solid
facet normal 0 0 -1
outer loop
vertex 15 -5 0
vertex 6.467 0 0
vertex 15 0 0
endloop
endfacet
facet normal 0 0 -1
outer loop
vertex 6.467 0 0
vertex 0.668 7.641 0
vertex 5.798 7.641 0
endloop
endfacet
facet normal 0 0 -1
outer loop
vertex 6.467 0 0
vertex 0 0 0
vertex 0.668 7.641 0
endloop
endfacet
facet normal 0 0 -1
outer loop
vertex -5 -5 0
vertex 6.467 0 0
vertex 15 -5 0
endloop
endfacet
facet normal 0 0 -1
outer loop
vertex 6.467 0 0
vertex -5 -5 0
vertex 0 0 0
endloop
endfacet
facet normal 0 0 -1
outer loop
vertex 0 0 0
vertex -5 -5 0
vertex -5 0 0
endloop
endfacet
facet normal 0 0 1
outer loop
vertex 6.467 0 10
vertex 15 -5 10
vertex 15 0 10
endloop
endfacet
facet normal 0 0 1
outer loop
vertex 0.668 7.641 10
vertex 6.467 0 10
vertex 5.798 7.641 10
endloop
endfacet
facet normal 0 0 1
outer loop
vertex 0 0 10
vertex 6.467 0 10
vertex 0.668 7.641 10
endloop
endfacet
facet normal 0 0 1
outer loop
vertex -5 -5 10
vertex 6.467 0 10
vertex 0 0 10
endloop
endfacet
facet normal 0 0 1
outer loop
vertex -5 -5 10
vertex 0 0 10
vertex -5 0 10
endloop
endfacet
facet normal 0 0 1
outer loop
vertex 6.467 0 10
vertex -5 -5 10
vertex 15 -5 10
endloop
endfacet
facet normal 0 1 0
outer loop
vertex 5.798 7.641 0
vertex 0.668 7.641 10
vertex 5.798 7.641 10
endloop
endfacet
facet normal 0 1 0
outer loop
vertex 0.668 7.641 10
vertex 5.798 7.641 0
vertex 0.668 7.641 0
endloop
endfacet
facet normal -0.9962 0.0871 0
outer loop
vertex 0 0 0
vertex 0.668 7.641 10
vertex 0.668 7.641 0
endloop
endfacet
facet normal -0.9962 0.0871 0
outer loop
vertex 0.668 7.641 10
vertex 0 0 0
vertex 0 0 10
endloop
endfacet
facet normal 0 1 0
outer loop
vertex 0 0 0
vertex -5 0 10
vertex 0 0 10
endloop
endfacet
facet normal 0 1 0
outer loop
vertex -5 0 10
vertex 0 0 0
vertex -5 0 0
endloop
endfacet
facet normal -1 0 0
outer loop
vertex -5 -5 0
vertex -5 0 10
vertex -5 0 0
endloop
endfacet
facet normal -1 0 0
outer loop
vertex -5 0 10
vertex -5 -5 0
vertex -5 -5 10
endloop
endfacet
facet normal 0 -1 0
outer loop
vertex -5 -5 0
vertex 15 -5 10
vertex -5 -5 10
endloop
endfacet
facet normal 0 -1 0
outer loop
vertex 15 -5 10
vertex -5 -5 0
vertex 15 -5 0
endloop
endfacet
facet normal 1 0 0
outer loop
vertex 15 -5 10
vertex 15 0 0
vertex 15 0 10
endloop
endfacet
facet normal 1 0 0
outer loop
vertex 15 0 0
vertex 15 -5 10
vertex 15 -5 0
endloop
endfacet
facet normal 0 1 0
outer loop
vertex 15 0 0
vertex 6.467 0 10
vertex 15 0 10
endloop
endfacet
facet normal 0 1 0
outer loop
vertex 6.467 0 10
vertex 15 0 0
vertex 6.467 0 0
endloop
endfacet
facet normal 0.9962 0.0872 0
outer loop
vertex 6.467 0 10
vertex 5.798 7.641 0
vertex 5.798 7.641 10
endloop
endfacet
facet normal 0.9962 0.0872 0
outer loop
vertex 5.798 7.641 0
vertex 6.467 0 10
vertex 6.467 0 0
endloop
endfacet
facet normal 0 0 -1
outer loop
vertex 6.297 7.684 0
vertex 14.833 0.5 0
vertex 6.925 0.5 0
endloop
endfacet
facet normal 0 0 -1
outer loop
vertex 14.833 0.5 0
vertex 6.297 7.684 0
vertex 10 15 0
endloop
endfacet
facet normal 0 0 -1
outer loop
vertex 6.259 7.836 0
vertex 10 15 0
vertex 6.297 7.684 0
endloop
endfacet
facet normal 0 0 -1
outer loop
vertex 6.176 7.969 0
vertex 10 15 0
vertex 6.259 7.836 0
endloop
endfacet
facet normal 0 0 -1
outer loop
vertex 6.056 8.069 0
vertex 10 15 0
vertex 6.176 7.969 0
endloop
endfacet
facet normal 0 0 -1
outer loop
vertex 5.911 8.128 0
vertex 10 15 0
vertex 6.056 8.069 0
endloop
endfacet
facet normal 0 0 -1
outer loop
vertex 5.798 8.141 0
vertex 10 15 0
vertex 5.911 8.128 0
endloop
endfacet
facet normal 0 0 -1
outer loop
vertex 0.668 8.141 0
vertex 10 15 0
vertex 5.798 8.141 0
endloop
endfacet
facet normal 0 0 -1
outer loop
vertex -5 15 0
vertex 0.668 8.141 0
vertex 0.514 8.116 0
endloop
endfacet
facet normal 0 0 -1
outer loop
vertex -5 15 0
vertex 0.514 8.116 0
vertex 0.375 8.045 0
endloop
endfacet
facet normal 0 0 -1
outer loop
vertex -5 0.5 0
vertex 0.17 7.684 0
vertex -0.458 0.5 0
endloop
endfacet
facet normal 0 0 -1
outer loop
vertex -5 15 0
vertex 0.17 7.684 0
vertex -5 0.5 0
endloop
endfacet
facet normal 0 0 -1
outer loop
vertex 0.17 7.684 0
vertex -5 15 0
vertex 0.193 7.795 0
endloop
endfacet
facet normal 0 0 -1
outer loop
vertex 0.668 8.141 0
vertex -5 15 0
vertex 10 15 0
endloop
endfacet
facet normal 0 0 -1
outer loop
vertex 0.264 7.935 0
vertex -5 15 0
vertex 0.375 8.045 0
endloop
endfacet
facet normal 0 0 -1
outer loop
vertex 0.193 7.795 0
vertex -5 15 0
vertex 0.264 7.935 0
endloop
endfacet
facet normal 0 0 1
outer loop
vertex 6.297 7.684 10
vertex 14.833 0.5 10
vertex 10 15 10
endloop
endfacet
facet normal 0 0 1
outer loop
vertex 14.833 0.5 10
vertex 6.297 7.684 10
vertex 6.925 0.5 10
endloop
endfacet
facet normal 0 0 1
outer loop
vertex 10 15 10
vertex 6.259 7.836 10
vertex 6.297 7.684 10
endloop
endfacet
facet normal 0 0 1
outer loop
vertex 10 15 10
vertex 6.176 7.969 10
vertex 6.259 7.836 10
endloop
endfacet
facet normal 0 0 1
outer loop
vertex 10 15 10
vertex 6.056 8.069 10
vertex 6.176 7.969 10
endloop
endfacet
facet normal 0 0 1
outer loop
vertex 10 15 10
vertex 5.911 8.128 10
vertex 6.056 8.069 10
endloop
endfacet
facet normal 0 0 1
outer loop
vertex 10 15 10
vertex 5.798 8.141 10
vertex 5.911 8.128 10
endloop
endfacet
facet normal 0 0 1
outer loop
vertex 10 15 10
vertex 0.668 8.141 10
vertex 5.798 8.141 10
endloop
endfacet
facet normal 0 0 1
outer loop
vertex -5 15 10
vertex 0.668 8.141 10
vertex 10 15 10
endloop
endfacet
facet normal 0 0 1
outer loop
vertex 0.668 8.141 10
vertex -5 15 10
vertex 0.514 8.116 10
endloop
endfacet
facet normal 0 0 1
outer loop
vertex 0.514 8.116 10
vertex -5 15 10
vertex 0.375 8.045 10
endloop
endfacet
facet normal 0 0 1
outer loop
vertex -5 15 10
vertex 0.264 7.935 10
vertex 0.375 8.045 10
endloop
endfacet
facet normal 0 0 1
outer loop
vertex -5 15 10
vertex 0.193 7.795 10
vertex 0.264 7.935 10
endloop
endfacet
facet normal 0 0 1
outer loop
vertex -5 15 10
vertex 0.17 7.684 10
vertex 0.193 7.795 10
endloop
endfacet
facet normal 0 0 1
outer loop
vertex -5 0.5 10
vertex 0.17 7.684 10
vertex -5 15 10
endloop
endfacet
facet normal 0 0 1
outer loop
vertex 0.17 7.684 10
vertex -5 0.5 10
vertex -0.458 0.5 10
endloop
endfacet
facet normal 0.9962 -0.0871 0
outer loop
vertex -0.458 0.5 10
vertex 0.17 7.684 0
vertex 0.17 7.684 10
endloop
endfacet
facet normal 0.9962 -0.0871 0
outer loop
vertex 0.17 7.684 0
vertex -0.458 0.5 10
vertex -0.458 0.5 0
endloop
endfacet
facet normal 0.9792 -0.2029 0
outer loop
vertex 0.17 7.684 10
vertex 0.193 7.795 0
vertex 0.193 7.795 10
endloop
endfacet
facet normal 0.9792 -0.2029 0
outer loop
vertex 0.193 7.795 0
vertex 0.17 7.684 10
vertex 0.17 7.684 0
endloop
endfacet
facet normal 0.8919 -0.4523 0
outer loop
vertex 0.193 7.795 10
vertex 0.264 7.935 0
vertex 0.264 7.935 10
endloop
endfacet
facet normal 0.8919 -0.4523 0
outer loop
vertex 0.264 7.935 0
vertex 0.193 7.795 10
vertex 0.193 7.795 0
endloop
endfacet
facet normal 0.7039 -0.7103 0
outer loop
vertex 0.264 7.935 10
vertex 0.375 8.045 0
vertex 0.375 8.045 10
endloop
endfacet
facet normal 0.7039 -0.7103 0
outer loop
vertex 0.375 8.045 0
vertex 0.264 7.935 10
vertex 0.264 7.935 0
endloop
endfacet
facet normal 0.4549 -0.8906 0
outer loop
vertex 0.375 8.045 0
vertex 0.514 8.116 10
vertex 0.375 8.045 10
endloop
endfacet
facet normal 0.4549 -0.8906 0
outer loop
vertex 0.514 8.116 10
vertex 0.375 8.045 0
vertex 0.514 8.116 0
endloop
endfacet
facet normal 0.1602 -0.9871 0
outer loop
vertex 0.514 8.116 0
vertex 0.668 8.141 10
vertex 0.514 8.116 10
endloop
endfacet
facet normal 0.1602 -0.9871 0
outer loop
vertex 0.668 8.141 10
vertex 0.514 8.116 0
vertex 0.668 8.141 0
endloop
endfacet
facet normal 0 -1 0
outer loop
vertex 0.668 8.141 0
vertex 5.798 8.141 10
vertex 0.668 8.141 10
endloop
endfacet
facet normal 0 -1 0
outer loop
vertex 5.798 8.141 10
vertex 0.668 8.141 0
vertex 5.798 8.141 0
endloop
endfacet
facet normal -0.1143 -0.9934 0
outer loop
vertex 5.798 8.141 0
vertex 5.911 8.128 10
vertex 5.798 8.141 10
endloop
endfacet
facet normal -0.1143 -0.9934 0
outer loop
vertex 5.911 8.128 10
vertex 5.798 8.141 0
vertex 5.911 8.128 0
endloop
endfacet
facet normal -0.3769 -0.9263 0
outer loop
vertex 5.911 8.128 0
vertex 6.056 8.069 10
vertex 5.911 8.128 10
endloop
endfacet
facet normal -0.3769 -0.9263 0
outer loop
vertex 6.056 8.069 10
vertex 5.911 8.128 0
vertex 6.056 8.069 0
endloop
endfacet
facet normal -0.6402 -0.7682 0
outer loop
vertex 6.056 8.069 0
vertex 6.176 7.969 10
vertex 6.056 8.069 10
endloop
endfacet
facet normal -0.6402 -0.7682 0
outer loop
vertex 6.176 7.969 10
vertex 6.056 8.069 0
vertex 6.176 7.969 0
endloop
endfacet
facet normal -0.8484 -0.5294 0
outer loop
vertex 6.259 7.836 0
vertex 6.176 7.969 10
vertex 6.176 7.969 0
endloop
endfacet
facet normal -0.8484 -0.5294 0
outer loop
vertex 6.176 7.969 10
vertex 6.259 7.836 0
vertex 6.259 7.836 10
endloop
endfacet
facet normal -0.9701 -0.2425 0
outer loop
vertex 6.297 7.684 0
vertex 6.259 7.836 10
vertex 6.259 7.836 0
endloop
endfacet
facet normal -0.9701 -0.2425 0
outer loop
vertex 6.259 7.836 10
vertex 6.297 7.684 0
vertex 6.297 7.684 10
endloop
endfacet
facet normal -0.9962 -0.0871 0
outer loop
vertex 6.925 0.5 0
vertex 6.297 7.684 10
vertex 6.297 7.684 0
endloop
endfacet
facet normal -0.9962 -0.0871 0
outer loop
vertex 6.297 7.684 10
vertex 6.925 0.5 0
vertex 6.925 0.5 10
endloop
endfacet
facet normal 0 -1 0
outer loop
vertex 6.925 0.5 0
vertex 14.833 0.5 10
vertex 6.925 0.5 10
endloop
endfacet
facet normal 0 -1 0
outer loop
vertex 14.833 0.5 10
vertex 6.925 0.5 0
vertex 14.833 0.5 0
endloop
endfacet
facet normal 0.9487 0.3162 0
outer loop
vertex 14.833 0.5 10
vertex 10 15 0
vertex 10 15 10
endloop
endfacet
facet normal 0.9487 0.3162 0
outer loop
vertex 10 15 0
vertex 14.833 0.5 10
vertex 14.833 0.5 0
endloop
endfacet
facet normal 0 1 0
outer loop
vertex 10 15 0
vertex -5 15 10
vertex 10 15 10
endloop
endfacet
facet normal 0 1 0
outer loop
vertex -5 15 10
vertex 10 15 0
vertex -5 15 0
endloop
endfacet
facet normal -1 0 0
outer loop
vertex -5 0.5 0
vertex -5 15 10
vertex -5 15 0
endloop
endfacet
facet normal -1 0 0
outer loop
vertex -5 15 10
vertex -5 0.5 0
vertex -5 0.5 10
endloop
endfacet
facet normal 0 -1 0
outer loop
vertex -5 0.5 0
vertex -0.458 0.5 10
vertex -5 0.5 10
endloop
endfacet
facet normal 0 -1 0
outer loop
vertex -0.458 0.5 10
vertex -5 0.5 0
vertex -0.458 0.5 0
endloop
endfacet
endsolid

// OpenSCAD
// Memory line folding mould
/* This is a simple extrustion that was designed to fold brass strip to make
   parts for the old-style diagonal memory unit. It didn't work very well. */
fold1_length = 7.67;
fold2_length = 5.13;
fold3_length = 7.67;
fold4_length = 7.67;
fold5_length = 6.99;
fold6_length = 7.7;

fold0_angle = 10;
fold1_angle = fold0_angle + 80;
fold2_angle = fold1_angle + 80;
fold3_angle = fold2_angle + -160;
fold4_angle = fold3_angle + 80;
fold5_angle = fold4_angle + -80;
$fn = 20;
angle_exaggeration = 1.10;;

// Define all the points on the shape
ex = angle_exaggeration;
a = [0,0];
b = [ a[0] + fold1_length*cos(fold0_angle * ex), a[1] + fold1_length*sin(fold0_angle * ex) ];
c = [ b[0] + fold2_length*cos(fold1_angle * ex), b[1] + fold2_length*sin(fold1_angle * ex) ];
d = [ c[0] + fold3_length*cos(fold2_angle * ex), c[1] + fold3_length*sin(fold2_angle * ex) ];
e = [ d[0] + fold4_length*cos(fold3_angle * ex), d[1] + fold4_length*sin(fold3_angle * ex) ];
f = [ e[0] + fold5_length*cos(fold4_angle * ex), e[1] + fold5_length*sin(fold4_angle * ex) ];
g = [ f[0] + fold6_length*cos(fold5_angle * ex), f[1] + fold6_length*sin(fold5_angle * ex) ];



module mould_part1() {
a = [0,0];
b = [ a[0] + fold1_length*cos(85),  a[1] + fold1_length*sin(85)  ];
c = [ b[0] + fold2_length*cos(0),   b[1] + fold2_length*sin(0)   ];
d = [ c[0] + fold3_length*cos(-85), c[1] + fold3_length*sin(-85) ];
e = [ d[0] + fold4_length*cos(0),   d[1] + fold4_length*sin(0)   ];
union() {
polygon(points = [ a, b , c, d, e, [2.5,-1]]);
translate([-5,-5]) square([20,5]);
}
}

module mould_part1_outer() {
difference() {
translate([-5,0]) polygon(points = [[0,0],[20,0],[15,15], [0,15]]);
offset(r=0.5) mould_part1();
}
}

linear_extrude(height=10) mould_part1();
linear_extrude(height=10) mould_part1_outer();
